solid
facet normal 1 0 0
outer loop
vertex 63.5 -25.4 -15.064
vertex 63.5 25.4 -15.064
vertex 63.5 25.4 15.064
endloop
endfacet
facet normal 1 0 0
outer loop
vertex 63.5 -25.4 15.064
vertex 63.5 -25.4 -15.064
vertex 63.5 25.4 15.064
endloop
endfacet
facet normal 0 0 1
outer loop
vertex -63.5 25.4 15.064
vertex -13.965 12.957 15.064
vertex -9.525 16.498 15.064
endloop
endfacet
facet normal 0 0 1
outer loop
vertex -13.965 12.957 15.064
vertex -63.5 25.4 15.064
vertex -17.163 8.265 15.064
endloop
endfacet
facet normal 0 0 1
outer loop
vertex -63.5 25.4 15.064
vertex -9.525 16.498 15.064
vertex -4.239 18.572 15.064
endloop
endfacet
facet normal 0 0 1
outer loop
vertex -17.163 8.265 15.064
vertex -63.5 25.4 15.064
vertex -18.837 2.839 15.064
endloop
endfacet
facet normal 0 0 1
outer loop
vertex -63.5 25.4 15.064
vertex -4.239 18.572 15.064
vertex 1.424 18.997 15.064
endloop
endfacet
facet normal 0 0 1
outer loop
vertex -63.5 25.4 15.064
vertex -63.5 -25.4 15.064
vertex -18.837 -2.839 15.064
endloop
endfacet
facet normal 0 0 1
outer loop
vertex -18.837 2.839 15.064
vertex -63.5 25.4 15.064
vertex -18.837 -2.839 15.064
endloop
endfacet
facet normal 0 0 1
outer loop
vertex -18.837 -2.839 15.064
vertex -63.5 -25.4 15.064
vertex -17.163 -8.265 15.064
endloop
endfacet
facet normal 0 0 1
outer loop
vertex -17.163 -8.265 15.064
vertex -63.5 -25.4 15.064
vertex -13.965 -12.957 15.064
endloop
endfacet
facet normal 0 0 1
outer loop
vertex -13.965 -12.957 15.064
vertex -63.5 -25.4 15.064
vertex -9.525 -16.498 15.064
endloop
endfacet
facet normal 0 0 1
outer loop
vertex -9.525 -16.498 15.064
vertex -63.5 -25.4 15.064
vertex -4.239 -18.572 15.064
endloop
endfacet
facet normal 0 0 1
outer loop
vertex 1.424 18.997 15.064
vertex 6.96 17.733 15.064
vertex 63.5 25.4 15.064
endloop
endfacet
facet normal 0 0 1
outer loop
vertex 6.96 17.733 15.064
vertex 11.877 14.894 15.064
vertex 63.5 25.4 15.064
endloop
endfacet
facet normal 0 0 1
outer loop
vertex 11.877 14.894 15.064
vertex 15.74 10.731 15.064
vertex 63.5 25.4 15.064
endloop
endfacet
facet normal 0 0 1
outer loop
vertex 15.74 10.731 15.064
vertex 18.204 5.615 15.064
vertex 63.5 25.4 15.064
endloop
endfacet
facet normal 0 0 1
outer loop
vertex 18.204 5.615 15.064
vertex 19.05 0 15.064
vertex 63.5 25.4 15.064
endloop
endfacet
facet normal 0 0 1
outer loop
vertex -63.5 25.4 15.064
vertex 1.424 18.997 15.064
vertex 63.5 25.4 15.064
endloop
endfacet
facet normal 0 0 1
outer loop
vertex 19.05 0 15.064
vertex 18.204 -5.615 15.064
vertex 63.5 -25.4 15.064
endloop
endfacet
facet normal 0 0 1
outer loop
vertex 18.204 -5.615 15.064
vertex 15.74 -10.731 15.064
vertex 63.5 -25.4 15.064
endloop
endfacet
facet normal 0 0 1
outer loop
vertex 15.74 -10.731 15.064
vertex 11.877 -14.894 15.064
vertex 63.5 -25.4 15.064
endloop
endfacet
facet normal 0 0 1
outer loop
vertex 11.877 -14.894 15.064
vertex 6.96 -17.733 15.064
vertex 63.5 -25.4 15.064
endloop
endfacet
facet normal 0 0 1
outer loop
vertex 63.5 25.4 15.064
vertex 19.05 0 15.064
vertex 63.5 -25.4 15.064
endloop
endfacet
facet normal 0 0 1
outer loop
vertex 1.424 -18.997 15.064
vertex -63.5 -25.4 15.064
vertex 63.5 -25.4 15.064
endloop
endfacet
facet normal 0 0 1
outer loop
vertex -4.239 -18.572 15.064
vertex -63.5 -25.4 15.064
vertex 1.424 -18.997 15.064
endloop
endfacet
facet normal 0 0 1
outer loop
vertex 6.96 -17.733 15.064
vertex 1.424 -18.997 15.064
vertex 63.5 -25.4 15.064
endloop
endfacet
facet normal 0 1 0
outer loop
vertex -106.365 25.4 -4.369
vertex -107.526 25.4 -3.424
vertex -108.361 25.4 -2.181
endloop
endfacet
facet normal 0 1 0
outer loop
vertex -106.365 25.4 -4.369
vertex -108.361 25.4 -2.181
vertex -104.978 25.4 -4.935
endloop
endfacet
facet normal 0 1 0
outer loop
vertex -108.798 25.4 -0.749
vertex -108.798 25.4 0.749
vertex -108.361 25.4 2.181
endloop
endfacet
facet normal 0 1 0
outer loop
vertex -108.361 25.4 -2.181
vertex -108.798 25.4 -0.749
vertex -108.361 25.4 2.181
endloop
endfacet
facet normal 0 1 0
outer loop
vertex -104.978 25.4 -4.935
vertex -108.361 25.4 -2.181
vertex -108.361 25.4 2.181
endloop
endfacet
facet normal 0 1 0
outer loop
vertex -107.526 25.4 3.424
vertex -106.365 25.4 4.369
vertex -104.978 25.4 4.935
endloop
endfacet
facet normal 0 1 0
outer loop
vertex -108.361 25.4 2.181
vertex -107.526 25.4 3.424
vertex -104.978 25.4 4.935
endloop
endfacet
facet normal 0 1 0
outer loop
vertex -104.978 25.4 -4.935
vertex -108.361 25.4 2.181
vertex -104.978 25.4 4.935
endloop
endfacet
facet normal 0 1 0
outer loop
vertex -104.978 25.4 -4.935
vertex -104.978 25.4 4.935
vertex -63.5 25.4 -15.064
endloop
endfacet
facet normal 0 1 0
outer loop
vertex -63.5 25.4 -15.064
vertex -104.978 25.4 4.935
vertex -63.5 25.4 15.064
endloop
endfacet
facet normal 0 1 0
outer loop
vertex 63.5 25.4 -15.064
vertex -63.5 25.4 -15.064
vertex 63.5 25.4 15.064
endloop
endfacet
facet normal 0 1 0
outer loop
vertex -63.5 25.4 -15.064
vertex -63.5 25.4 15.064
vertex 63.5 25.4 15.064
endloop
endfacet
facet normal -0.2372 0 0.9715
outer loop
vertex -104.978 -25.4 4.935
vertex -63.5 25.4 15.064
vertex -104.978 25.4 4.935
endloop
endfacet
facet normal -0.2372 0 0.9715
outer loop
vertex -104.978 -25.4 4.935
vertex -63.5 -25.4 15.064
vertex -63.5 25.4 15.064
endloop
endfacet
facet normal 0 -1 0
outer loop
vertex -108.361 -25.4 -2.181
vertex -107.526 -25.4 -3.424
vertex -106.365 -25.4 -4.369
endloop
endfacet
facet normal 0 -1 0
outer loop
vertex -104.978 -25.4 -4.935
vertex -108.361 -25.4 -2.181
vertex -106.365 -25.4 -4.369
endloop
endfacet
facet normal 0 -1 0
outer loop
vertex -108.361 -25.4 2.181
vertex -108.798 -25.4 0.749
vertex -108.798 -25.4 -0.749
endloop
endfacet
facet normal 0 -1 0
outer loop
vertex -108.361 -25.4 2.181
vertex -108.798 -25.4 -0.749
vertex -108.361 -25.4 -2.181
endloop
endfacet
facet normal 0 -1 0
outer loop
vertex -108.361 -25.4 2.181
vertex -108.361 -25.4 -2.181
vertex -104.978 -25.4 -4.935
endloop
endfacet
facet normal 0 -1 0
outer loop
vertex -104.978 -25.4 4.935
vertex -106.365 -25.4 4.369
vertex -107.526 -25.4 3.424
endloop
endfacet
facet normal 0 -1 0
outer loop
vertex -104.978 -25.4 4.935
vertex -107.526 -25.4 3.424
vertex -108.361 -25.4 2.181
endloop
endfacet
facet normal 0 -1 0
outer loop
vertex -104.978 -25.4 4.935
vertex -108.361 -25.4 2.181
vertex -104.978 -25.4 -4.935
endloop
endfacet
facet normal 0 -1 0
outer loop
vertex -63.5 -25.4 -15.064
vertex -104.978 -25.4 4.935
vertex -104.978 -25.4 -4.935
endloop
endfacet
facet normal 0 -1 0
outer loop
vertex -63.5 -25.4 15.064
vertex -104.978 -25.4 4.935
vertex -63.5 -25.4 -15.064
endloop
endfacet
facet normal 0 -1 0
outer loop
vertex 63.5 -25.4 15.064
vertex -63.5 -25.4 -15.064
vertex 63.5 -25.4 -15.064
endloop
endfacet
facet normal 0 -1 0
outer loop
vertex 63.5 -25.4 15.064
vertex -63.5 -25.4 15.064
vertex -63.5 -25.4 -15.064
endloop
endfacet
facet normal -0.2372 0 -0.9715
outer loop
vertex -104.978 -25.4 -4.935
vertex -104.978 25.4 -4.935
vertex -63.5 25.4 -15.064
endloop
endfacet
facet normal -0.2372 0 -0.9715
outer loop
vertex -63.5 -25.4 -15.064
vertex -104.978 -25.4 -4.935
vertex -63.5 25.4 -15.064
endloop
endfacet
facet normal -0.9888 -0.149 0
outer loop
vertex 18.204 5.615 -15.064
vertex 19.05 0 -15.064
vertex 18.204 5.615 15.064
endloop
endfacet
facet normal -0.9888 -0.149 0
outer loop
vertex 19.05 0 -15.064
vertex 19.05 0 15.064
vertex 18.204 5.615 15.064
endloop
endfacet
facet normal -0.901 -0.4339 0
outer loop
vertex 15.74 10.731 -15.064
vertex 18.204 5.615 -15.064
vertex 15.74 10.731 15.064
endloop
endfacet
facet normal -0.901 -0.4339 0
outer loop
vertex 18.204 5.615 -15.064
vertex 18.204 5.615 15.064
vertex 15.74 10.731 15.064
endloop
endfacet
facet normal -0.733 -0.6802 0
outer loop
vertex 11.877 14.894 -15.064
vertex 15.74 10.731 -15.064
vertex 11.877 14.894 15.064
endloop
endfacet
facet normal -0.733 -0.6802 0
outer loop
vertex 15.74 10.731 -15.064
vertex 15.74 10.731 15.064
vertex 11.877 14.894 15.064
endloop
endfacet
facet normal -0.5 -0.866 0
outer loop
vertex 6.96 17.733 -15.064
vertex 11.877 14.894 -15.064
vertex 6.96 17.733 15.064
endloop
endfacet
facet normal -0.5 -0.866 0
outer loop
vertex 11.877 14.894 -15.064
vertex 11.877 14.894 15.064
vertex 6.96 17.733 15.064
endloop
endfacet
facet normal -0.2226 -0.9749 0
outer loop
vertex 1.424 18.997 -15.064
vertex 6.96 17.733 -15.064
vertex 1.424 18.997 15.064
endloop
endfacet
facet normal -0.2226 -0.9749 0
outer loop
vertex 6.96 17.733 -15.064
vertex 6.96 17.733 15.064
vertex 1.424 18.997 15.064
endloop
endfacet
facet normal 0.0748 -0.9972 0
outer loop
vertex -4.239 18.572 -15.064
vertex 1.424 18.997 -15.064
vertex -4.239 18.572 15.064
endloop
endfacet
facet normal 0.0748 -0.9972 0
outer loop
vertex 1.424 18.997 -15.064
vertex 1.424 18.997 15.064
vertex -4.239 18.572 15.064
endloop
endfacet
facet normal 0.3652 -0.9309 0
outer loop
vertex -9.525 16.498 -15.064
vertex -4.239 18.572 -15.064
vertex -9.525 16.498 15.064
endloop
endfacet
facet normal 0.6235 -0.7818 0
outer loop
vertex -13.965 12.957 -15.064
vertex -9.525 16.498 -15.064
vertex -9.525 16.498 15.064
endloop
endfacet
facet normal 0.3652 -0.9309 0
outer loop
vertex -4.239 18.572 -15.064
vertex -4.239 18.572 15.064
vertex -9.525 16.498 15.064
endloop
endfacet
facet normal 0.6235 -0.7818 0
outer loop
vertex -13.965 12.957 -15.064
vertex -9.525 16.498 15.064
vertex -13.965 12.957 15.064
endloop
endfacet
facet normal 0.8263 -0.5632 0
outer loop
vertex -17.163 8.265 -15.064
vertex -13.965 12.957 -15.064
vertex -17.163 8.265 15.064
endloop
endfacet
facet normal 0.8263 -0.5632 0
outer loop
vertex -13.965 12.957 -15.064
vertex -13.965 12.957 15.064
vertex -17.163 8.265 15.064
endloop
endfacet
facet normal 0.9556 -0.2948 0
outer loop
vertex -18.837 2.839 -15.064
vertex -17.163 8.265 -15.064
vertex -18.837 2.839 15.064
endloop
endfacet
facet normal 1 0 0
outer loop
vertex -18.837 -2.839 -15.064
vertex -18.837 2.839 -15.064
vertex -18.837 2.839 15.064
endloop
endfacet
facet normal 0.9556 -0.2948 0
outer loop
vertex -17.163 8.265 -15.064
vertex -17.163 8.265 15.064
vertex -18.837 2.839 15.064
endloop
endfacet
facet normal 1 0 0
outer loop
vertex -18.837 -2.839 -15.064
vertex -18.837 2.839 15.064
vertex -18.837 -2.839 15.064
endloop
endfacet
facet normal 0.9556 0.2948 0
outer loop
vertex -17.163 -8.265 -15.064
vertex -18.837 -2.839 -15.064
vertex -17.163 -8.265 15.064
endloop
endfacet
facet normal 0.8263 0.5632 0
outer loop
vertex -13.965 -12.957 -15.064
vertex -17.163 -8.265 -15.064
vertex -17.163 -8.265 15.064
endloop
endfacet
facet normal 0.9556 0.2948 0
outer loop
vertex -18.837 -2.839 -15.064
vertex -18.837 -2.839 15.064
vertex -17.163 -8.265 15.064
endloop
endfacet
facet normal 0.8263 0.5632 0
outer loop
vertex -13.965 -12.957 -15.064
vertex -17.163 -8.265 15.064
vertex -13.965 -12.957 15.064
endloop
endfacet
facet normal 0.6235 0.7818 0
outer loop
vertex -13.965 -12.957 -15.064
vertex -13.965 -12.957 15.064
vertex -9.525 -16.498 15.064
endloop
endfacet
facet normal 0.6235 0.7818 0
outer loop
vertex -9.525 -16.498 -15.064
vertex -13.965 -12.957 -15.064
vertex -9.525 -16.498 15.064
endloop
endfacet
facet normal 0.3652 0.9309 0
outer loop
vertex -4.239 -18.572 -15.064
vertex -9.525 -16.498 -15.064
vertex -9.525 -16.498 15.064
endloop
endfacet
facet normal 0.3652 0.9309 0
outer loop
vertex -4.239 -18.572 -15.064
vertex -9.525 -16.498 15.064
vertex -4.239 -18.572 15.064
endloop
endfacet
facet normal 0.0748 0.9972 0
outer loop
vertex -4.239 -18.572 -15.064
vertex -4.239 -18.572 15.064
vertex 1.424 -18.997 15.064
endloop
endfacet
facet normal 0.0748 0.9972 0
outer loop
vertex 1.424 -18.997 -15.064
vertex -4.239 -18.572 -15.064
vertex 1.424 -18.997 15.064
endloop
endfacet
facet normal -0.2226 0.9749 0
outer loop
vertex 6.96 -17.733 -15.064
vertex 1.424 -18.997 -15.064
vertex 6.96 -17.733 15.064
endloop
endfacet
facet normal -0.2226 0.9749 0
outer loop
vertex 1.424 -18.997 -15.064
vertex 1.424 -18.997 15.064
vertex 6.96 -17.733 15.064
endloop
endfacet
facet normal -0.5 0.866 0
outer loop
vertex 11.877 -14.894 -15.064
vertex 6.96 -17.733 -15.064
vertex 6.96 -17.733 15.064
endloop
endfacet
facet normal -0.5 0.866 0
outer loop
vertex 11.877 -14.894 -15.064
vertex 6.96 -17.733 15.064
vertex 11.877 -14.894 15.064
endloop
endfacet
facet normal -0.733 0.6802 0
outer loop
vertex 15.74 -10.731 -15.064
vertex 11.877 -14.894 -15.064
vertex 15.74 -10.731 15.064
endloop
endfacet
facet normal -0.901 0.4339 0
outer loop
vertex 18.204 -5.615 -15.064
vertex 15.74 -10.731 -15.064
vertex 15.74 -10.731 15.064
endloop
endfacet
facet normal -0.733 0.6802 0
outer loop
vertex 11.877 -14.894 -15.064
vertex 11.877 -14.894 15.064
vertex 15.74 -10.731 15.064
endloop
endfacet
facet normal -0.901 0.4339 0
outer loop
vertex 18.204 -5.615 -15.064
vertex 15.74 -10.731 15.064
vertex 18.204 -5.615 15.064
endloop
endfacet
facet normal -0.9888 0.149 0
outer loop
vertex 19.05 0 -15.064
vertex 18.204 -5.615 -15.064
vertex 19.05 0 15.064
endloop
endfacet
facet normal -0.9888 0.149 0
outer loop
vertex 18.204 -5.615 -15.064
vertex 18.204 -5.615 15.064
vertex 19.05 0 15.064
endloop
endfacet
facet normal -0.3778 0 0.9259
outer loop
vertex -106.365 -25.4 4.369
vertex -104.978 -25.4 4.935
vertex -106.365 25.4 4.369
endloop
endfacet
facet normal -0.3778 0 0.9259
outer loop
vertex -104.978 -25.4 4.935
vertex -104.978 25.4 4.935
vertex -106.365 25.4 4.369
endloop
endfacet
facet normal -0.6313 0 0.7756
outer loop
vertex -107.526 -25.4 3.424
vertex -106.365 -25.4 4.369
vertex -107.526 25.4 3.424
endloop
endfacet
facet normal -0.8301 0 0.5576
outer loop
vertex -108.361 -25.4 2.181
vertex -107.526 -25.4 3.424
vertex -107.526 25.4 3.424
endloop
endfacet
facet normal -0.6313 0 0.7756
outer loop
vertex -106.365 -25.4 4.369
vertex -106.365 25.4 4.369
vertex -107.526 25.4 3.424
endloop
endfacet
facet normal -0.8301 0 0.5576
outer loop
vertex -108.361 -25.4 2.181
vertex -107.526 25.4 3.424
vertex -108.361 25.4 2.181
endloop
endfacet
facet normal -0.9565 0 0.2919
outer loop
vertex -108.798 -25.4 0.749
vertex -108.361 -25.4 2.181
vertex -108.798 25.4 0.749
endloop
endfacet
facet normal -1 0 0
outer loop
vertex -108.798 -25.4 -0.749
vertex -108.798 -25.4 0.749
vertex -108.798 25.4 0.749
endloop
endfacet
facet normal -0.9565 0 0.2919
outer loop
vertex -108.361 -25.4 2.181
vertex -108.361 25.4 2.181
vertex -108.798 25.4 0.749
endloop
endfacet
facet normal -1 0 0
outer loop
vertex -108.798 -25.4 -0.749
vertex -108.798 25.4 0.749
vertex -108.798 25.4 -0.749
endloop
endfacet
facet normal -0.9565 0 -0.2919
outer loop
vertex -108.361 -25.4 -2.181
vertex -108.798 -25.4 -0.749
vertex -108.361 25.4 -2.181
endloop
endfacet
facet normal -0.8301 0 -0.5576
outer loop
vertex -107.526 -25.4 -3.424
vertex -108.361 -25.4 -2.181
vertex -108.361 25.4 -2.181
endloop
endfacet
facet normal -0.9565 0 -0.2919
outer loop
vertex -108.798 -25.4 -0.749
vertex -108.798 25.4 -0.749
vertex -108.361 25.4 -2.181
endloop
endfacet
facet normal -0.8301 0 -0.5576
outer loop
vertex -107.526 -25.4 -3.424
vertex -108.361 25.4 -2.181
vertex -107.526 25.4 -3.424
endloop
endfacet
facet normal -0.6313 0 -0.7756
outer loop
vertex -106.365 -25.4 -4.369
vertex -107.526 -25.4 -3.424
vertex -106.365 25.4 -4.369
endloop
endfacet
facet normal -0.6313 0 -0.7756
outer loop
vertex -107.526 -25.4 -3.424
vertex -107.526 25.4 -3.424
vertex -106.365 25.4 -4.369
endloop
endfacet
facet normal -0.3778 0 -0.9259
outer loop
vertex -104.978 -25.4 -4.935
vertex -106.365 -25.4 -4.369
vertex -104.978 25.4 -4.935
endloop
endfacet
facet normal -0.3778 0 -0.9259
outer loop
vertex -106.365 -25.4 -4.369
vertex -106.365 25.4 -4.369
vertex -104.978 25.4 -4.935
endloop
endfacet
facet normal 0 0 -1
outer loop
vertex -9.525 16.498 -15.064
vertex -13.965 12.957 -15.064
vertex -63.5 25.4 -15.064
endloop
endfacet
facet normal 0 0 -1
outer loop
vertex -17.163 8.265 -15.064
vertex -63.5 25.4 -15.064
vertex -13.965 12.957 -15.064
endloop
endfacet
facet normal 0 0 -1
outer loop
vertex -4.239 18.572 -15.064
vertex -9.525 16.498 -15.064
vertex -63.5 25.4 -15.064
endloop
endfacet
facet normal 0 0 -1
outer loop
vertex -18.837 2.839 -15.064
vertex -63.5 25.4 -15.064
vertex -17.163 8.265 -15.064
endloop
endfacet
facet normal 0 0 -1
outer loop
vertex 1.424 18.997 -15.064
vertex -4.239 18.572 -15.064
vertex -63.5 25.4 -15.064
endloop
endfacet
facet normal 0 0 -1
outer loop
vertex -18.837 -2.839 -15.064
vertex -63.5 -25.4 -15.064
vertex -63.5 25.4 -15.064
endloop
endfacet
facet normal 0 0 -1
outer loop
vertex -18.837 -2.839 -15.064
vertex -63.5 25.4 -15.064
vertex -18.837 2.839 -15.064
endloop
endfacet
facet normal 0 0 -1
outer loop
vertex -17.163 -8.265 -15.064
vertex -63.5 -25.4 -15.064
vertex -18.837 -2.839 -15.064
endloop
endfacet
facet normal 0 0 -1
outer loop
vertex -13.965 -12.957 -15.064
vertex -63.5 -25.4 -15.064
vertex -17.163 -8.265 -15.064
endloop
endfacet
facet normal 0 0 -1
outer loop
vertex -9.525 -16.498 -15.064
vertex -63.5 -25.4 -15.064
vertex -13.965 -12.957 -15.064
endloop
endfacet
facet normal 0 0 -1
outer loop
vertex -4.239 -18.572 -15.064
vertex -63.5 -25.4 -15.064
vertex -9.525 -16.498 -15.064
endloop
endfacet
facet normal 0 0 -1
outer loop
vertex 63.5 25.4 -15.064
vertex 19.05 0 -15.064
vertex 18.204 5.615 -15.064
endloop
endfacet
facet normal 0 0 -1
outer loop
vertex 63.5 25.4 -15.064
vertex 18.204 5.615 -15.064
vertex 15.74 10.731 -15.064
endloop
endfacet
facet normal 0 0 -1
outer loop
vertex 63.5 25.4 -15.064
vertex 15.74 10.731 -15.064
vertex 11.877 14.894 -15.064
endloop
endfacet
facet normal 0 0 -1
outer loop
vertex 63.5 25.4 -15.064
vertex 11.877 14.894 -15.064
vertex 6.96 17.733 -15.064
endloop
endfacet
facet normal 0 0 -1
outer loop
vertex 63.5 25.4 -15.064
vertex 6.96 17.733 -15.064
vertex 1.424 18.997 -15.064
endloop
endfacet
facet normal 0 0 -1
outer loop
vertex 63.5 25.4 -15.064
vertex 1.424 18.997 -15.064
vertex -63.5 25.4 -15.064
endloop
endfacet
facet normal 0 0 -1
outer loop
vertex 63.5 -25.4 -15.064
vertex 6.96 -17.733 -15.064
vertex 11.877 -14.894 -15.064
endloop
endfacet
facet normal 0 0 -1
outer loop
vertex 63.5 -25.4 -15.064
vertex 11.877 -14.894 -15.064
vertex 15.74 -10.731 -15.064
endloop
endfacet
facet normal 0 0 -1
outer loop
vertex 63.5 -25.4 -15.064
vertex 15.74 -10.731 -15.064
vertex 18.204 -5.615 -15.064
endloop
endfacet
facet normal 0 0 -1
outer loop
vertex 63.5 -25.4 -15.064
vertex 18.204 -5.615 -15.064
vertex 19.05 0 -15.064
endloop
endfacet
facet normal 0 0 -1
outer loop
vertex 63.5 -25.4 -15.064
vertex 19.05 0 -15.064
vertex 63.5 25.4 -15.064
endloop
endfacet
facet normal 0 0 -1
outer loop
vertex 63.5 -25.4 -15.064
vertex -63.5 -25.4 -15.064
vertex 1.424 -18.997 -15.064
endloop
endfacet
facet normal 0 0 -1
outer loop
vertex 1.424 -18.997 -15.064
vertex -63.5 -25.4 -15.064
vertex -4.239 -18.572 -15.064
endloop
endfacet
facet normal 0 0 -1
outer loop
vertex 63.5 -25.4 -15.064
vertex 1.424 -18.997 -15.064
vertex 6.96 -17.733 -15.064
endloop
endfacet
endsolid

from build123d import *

# Parameters (mm, degrees)
F0_W          = 127
F0_H          = 30.127738
F1_DEPTH      = 25.4
F1_DEPTH_BACK = 25.4
F2_R          = 19.05
F3_DEPTH      = 15.064869
F3_DEPTH_BACK = 15.063869
F4_R          = 5.08


with BuildPart() as f1:
    # F0 (on Front) → F1 (new body, two sides)
    with BuildSketch(Plane.XZ) as f1_sk:
        Rectangle(F0_W, F0_H)
        Polygon((-63.5, -15.063869), (-63.5, 15.063869), (-125.187356, 0), align=None)
    extrude(amount=F1_DEPTH)
    extrude(f1_sk.sketch, amount=-F1_DEPTH_BACK)

    # F2 (on Top) → F3 (cut, two sides)
    with BuildSketch(Plane.XY) as f3_sk:
        Circle(F2_R)
    extrude(amount=F3_DEPTH, mode=Mode.SUBTRACT)
    extrude(f3_sk.sketch, amount=-F3_DEPTH_BACK, mode=Mode.SUBTRACT)

    # F4
    f4_edges = [f1.edges().sort_by_distance(p)[0] for p in [
        (-125.187356, 0, 0),
    ]]
    fillet(f4_edges, radius=F4_R)


solid = f1.part
